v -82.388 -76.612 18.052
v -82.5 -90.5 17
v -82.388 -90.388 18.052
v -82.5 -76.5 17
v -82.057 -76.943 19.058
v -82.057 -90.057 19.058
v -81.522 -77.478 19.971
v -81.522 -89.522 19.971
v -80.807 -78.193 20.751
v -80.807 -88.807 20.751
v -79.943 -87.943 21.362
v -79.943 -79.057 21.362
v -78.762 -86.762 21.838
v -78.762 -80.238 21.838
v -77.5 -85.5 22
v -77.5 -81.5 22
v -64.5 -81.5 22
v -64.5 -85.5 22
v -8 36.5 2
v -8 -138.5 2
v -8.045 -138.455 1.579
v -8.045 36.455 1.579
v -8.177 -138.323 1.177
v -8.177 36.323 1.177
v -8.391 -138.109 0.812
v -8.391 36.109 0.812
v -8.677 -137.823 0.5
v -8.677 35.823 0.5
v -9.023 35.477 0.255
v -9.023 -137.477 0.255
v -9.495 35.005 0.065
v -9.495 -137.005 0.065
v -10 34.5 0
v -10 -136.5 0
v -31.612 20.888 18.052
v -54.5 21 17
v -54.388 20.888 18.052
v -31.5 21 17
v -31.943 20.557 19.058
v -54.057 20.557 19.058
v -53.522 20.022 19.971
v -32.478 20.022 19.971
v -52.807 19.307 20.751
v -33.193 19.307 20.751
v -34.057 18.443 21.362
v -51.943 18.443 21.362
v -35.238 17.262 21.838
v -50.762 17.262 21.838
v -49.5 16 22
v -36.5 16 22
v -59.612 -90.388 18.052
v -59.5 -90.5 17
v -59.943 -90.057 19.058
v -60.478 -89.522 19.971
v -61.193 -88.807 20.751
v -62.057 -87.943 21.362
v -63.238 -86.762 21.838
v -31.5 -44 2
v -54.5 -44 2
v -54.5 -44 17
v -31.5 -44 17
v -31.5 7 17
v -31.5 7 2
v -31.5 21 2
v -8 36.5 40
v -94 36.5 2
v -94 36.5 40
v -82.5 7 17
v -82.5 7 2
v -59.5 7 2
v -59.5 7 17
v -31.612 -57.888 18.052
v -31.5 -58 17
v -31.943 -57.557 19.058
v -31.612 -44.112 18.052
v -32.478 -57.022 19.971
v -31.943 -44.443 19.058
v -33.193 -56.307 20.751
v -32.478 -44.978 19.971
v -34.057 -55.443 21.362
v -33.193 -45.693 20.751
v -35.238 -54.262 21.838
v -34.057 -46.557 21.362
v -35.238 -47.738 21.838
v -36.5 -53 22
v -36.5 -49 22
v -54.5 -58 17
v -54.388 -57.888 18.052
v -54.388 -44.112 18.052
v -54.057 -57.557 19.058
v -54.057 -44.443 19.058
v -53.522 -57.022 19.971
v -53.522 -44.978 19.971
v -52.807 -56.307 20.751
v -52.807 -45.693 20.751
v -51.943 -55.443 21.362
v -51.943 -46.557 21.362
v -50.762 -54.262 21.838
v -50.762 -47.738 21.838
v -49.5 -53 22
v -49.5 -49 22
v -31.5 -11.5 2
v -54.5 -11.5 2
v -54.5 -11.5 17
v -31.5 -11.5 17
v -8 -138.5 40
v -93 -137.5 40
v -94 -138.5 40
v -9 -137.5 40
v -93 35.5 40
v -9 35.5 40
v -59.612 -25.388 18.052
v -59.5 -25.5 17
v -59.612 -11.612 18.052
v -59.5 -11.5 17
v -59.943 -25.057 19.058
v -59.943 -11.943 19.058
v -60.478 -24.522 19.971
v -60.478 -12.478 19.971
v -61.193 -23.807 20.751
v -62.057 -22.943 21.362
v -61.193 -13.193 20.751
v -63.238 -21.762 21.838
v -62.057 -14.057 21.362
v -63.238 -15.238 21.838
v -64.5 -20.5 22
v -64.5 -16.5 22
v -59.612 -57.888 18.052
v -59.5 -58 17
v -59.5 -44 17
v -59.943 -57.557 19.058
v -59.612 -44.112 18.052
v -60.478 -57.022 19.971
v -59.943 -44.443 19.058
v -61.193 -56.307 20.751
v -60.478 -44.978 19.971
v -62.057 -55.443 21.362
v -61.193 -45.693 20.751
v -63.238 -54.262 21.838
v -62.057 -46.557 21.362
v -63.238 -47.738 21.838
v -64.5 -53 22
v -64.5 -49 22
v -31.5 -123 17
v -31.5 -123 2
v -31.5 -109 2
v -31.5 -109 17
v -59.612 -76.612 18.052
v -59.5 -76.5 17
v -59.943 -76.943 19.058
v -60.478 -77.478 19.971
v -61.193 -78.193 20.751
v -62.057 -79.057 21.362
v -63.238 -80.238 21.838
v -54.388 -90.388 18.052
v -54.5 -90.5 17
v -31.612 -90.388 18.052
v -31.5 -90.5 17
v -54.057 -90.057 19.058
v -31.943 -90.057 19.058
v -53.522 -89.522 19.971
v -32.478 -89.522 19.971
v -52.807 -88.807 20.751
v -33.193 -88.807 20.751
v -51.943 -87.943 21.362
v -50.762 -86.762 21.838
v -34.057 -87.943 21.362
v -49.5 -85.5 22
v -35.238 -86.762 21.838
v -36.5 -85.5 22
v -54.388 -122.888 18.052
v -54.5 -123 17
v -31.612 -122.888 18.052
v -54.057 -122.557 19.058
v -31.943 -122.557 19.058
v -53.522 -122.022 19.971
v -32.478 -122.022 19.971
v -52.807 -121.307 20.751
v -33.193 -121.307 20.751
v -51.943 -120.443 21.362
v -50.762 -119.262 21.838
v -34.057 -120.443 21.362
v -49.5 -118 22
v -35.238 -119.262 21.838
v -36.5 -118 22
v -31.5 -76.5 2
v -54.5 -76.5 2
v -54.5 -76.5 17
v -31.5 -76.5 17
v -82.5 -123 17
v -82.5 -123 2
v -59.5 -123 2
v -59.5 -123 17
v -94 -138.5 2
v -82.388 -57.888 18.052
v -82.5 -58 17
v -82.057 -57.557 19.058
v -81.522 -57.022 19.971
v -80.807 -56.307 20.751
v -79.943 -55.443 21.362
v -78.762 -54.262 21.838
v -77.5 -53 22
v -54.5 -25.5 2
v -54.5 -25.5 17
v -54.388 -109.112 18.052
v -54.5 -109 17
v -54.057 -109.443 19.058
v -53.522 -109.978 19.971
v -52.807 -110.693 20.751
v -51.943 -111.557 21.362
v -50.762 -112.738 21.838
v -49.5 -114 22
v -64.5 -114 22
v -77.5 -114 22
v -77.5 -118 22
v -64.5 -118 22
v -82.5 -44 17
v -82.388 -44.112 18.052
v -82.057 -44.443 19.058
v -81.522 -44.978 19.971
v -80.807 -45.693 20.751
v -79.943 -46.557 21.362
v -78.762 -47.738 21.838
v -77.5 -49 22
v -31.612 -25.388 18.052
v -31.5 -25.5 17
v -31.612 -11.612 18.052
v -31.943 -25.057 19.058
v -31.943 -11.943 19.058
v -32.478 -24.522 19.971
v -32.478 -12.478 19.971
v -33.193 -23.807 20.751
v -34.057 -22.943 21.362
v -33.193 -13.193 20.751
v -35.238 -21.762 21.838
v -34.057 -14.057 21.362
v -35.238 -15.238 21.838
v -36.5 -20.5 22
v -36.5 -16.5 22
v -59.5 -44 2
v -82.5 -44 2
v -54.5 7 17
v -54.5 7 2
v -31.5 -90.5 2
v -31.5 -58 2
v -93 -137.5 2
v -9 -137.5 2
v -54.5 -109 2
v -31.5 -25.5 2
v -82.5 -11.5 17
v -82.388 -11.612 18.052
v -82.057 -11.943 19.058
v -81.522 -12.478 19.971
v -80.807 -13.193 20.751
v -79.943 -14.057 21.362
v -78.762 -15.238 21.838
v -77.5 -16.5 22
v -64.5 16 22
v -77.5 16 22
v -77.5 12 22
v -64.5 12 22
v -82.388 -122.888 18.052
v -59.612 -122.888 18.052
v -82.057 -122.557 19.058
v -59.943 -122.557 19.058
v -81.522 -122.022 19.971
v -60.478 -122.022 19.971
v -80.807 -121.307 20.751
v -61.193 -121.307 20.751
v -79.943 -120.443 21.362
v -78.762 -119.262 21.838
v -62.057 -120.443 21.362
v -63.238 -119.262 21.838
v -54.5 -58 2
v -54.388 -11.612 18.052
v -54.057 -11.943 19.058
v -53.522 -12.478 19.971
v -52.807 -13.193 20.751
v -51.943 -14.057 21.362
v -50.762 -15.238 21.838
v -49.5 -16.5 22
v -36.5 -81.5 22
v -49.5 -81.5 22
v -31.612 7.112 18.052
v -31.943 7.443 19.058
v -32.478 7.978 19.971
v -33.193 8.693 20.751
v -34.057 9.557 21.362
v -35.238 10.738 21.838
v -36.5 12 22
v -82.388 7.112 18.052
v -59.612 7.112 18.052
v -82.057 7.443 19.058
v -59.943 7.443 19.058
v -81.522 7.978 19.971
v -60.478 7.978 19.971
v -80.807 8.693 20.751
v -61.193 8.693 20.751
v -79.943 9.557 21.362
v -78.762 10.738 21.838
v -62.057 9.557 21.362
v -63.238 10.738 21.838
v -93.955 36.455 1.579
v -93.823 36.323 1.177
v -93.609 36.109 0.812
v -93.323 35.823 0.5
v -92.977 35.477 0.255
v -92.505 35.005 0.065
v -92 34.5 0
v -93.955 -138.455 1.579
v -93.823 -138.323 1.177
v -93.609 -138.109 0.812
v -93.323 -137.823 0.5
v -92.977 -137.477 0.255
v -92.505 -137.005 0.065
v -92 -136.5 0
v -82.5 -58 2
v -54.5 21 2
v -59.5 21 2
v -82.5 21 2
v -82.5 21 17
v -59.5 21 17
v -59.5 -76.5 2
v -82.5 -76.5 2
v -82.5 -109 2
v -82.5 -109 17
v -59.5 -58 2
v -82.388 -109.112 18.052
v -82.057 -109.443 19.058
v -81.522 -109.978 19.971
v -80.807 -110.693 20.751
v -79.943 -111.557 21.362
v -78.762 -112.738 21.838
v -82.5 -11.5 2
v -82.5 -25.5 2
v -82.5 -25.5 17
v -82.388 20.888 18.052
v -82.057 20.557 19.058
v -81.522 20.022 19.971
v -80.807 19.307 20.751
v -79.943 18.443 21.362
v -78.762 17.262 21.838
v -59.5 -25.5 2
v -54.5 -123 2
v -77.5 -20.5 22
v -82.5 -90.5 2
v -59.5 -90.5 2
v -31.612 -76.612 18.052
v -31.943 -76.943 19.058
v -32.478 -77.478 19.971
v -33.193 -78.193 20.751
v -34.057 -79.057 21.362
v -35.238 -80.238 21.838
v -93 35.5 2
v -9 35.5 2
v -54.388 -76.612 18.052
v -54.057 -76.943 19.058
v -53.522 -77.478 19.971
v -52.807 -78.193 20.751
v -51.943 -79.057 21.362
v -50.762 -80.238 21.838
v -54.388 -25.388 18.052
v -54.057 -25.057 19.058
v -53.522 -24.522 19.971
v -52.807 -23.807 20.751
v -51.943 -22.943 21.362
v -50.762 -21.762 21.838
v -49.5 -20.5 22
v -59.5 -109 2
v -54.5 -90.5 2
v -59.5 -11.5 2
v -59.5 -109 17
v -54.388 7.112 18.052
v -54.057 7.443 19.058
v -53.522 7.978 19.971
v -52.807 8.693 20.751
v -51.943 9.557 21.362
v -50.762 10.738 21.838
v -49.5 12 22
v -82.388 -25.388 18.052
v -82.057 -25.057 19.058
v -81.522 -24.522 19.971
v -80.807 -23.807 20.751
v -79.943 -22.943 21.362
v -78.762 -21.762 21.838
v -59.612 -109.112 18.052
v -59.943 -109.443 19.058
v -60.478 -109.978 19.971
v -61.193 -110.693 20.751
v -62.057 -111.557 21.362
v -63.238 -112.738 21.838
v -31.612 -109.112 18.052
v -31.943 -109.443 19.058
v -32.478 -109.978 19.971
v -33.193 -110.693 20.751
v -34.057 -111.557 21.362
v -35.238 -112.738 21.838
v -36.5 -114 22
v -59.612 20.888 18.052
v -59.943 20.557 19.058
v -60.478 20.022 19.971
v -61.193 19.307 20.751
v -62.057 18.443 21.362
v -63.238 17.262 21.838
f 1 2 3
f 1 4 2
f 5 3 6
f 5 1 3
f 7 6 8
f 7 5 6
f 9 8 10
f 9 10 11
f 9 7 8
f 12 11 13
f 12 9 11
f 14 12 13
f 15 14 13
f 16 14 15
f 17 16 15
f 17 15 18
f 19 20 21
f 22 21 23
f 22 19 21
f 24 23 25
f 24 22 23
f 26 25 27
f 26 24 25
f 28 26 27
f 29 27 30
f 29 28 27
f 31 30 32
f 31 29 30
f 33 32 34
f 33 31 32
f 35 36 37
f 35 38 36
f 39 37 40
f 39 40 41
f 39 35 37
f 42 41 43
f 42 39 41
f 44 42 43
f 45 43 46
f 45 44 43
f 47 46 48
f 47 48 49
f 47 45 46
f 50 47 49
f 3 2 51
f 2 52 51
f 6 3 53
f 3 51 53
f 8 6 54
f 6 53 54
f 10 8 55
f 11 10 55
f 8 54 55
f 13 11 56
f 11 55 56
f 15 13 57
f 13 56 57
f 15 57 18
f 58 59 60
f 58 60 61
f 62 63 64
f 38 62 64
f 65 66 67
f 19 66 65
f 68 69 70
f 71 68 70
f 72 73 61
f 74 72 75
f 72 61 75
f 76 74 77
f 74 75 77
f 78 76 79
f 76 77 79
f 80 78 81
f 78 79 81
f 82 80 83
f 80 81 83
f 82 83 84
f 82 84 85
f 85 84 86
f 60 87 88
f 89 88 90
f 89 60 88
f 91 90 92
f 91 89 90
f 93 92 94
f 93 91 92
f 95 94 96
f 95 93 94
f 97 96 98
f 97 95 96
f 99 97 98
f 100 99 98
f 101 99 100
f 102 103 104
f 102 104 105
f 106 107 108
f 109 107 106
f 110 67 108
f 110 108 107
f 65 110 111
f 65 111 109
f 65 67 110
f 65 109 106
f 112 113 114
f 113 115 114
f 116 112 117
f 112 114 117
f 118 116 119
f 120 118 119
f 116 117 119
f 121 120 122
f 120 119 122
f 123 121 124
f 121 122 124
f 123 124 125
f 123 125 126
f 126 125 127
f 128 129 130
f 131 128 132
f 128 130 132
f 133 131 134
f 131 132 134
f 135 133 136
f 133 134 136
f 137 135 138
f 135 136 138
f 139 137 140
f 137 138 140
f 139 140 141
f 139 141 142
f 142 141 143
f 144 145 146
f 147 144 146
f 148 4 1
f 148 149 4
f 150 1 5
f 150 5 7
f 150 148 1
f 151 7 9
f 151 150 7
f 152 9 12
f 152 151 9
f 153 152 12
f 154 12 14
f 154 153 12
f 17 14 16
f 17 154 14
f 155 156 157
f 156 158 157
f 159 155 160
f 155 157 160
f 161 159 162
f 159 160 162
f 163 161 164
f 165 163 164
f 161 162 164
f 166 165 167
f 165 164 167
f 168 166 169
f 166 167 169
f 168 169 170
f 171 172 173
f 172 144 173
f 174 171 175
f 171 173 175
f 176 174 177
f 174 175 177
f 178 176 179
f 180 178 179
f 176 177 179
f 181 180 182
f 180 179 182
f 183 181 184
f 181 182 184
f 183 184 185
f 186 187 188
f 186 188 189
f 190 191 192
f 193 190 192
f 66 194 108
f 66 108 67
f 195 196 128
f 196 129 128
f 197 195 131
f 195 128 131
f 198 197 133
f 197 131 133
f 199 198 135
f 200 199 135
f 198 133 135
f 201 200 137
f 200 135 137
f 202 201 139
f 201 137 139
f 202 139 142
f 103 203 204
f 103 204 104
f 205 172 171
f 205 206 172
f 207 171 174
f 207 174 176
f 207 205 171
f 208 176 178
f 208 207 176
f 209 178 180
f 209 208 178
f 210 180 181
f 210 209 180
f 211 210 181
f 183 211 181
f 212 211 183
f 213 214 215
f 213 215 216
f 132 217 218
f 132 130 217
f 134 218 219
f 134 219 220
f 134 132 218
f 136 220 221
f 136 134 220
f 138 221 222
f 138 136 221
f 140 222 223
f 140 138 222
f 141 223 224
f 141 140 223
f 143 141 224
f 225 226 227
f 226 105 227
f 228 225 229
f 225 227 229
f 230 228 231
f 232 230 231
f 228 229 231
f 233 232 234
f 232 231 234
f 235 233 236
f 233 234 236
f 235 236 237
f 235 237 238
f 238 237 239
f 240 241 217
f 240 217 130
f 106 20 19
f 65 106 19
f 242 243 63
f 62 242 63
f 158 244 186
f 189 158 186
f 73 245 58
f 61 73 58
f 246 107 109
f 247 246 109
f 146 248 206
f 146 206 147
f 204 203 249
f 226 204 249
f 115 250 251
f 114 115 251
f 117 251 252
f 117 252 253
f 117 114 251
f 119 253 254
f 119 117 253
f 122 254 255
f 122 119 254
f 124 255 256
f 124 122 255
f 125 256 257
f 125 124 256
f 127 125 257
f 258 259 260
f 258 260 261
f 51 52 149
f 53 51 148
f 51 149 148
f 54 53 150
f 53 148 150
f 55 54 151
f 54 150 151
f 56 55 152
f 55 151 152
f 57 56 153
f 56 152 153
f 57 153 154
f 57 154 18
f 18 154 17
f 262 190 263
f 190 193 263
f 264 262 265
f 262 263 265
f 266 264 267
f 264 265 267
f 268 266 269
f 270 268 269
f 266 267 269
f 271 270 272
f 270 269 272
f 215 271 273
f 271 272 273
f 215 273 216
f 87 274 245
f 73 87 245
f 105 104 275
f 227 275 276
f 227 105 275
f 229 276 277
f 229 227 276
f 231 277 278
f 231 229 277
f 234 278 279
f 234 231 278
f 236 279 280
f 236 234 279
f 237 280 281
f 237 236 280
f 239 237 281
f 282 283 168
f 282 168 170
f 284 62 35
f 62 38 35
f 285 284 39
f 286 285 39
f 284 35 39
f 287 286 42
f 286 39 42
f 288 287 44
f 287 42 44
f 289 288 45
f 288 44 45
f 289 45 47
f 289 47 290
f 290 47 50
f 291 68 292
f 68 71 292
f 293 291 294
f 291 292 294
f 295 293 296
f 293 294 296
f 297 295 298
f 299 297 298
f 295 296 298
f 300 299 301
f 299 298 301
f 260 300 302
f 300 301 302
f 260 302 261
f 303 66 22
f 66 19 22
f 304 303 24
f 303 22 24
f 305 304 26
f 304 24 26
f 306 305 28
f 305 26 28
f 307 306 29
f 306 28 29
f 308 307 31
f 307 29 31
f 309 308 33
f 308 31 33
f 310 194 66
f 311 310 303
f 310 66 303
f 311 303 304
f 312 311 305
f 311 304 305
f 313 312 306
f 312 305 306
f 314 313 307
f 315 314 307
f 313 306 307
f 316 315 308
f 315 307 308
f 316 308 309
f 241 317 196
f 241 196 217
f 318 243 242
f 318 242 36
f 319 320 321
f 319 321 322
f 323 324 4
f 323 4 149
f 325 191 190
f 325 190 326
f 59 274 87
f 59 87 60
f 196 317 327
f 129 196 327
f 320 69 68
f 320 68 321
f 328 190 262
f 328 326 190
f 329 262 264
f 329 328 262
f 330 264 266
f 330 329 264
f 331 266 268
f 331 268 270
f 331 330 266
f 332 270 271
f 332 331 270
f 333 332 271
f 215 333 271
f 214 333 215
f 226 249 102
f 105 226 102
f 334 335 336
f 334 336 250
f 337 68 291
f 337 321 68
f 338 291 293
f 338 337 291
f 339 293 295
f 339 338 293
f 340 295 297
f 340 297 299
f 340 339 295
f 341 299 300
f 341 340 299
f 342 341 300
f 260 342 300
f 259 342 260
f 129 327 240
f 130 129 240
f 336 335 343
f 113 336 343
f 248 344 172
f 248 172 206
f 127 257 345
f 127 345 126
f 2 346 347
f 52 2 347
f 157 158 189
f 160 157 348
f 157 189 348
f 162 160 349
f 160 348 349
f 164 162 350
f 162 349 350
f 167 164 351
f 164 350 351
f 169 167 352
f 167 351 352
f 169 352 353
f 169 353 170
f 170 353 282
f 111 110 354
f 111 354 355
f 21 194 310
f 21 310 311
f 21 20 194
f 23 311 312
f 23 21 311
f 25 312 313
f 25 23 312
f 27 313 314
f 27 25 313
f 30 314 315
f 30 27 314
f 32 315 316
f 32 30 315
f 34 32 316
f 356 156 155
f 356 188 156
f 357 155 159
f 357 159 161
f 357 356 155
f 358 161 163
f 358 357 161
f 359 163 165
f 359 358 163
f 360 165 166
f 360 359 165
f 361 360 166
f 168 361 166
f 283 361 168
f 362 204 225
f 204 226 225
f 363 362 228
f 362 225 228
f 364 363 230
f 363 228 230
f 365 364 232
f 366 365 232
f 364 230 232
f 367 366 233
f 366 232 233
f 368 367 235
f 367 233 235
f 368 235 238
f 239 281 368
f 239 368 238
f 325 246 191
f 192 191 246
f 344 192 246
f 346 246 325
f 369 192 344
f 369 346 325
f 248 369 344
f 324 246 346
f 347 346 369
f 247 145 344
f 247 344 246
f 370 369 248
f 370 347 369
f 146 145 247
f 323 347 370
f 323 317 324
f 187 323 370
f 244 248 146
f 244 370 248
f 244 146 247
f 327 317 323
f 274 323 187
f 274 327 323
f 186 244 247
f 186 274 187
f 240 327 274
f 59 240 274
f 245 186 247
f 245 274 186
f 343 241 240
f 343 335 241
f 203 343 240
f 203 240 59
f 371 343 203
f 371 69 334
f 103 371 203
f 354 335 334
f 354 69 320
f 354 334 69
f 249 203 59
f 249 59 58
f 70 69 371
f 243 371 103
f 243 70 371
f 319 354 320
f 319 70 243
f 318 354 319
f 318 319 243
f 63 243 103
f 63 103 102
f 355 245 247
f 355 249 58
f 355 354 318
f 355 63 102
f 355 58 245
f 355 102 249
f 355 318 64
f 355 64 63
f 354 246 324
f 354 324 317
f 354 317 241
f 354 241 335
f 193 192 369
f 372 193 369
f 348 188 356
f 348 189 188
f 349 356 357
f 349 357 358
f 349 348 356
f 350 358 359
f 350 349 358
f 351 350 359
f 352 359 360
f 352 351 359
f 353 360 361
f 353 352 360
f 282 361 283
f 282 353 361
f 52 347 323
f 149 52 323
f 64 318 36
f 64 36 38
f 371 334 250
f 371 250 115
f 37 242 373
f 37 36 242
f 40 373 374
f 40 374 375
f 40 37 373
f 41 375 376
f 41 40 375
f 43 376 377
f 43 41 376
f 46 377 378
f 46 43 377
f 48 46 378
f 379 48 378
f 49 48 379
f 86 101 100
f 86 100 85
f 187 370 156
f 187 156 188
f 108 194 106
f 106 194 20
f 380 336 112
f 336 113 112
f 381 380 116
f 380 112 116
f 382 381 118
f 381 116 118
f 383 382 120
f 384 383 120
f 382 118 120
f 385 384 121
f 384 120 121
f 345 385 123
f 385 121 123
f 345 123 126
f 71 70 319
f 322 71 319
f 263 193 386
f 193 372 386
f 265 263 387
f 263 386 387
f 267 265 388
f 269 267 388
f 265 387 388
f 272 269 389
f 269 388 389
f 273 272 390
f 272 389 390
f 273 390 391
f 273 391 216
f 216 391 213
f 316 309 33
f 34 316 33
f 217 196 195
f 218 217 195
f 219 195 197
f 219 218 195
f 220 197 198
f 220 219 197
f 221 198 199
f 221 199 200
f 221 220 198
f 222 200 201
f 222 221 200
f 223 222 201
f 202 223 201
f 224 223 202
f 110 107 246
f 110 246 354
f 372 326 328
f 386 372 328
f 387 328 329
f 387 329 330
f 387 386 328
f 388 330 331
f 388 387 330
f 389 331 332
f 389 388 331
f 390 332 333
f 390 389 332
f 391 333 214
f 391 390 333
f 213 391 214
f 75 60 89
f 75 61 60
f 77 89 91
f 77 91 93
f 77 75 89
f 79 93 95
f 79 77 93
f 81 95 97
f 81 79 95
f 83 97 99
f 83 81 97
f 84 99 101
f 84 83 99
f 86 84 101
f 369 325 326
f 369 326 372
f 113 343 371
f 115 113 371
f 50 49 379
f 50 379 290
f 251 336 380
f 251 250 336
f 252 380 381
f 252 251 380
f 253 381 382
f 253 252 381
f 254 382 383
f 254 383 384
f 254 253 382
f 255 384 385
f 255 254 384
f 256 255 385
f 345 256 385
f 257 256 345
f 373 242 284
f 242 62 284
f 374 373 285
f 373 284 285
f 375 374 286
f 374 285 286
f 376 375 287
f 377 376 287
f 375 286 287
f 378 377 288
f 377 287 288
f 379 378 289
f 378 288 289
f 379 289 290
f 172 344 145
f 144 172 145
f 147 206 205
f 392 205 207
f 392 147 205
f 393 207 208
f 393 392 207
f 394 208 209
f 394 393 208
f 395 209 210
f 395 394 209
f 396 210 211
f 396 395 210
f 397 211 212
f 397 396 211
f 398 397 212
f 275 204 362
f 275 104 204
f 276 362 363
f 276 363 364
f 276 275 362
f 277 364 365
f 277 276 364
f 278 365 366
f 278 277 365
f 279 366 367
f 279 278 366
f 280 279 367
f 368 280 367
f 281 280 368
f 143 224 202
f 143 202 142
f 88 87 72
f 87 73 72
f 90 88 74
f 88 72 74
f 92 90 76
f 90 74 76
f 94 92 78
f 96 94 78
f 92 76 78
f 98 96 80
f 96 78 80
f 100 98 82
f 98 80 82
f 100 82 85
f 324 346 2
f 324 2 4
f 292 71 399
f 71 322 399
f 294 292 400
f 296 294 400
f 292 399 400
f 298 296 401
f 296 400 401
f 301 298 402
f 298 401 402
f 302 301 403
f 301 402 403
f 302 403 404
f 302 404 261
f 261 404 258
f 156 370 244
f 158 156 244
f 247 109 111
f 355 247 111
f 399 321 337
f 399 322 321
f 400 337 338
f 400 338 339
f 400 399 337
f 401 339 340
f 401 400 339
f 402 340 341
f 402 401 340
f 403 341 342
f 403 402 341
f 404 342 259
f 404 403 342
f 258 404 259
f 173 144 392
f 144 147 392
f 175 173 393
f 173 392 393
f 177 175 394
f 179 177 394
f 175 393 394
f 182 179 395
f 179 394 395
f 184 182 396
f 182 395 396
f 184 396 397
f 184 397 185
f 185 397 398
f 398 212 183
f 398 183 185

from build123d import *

# Parameters (mm, degrees)
SKETCH015_W                     = 86
SKETCH015_H                     = 175
PAD007_DEPTH                    = 40
SKETCH016_W                     = 84
SKETCH016_H                     = 173
POCKET007_DEPTH                 = 38
SKETCH017_W                     = 23
SKETCH017_H                     = 14
PAD008_DEPTH                    = 20
SKETCH017_LINEARPATTERN003_2_W  = 23
SKETCH017_LINEARPATTERN003_2_H  = 14
PAD008_LINEARPATTERN003_2_DEPTH = 20
SKETCH017_LINEARPATTERN003_3_W  = 23
SKETCH017_LINEARPATTERN003_3_H  = 14
PAD008_LINEARPATTERN003_3_DEPTH = 20
SKETCH017_LINEARPATTERN003_4_W  = 23
SKETCH017_LINEARPATTERN003_4_H  = 14
PAD008_LINEARPATTERN003_4_DEPTH = 20
SKETCH017_LINEARPATTERN003_5_W  = 23
SKETCH017_LINEARPATTERN003_5_H  = 14
PAD008_LINEARPATTERN003_5_DEPTH = 20
LINEARPATTERN004_COUNT          = 2
LINEARPATTERN004_PITCH          = 28
FILLET008_R                     = 5
FILLET009_R                     = 2


with BuildPart() as part:
    # Sketch015 → Pad007 (new body)
    with BuildSketch(Plane.XY):
        Rectangle(SKETCH015_W, SKETCH015_H)
    extrude(amount=PAD007_DEPTH)

    # Sketch016 (on DatumPlane) → Pocket007 (cut)
    with BuildSketch(Plane.XY.offset(40)):
        Rectangle(SKETCH016_W, SKETCH016_H)
    extrude(amount=-POCKET007_DEPTH, mode=Mode.SUBTRACT)

    # Sketch017 (on DatumPlane) → Pad008 (join)
    with BuildSketch(Plane(origin=(-20, 65, 2), x_dir=(1, 0, 0), z_dir=(0, 0, 1))):
        Rectangle(SKETCH017_W, SKETCH017_H)
    pad008 = extrude(amount=PAD008_DEPTH)

    # Sketch017 LinearPattern003 2 → Pad008 LinearPattern003 2 (add)
    with BuildSketch(Plane(origin=(-20, 32.5, 2), x_dir=(1, 0, 0), z_dir=(0, 0, 1))):
        Rectangle(SKETCH017_LINEARPATTERN003_2_W, SKETCH017_LINEARPATTERN003_2_H)
    pad008_linearpattern003_2 = extrude(amount=PAD008_LINEARPATTERN003_2_DEPTH)

    # Sketch017 LinearPattern003 3 → Pad008 LinearPattern003 3 (add)
    with BuildSketch(Plane(origin=(-20, 0, 2), x_dir=(1, 0, 0), z_dir=(0, 0, 1))):
        Rectangle(SKETCH017_LINEARPATTERN003_3_W, SKETCH017_LINEARPATTERN003_3_H)
    pad008_linearpattern003_3 = extrude(amount=PAD008_LINEARPATTERN003_3_DEPTH)

    # Sketch017 LinearPattern003 4 → Pad008 LinearPattern003 4 (add)
    with BuildSketch(Plane(origin=(-20, -32.5, 2), x_dir=(1, 0, 0), z_dir=(0, 0, 1))):
        Rectangle(SKETCH017_LINEARPATTERN003_4_W, SKETCH017_LINEARPATTERN003_4_H)
    pad008_linearpattern003_4 = extrude(amount=PAD008_LINEARPATTERN003_4_DEPTH)

    # Sketch017 LinearPattern003 5 → Pad008 LinearPattern003 5 (add)
    with BuildSketch(Plane(origin=(-20, -65, 2), x_dir=(1, 0, 0), z_dir=(0, 0, 1))):
        Rectangle(SKETCH017_LINEARPATTERN003_5_W, SKETCH017_LINEARPATTERN003_5_H)
    pad008_linearpattern003_5 = extrude(amount=PAD008_LINEARPATTERN003_5_DEPTH)

    # LinearPattern004: Pad008, Pad008 LinearPattern003 2, Pad008 LinearPattern003 3, Pad008 LinearPattern003 4, Pad008 LinearPattern003 5 ×2
    with Locations(*[(i * LINEARPATTERN004_PITCH, 0, 0) for i in range(1, LINEARPATTERN004_COUNT)]):
        add(pad008)
        add(pad008_linearpattern003_2)
        add(pad008_linearpattern003_3)
        add(pad008_linearpattern003_4)
        add(pad008_linearpattern003_5)

    # Fillet008
    fillet008_edges = [part.edges().sort_by_distance(p)[0] for p in [
        (-20, -25.5, 22),
        (-8.5, -32.5, 22),
        (-20, -39.5, 22),
        (-31.5, -32.5, 22),
        (-20, -58, 22),
        (-8.5, -65, 22),
        (-20, -72, 22),
        (-31.5, -65, 22),
        (8, -58, 22),
        (19.5, -65, 22),
        (8, -72, 22),
        (-3.5, -65, 22),
        (8, -25.5, 22),
        (19.5, -32.5, 22),
        (8, -39.5, 22),
        (-3.5, -32.5, 22),
        (-20, 7, 22),
        (-8.5, 0, 22),
        (-20, -7, 22),
        (-31.5, 0, 22),
        (8, 7, 22),
        (19.5, 0, 22),
        (8, -7, 22),
        (-3.5, 0, 22),
        (8, 39.5, 22),
        (19.5, 32.5, 22),
        (8, 25.5, 22),
        (-3.5, 32.5, 22),
        (-20, 72, 22),
        (-8.5, 65, 22),
        (-20, 58, 22),
        (-31.5, 65, 22),
        (8, 72, 22),
        (19.5, 65, 22),
        (8, 58, 22),
        (-3.5, 65, 22),
        (-20, 39.5, 22),
        (-8.5, 32.5, 22),
        (-20, 25.5, 22),
        (-31.5, 32.5, 22),
    ]]
    fillet(fillet008_edges, radius=FILLET008_R)

    # Fillet009
    fillet009_edges = [part.edges().sort_by_distance(p)[0] for p in [
        (0, 87.5, 0),
        (43, 0, 0),
        (0, -87.5, 0),
        (-43, 0, 0),
    ]]
    fillet(fillet009_edges, radius=FILLET009_R)


with BuildPart() as part_1:
    # Body006 placement: moved
    add(part.part.moved(Location((-51, -51, 0))))


solid = part_1.part
